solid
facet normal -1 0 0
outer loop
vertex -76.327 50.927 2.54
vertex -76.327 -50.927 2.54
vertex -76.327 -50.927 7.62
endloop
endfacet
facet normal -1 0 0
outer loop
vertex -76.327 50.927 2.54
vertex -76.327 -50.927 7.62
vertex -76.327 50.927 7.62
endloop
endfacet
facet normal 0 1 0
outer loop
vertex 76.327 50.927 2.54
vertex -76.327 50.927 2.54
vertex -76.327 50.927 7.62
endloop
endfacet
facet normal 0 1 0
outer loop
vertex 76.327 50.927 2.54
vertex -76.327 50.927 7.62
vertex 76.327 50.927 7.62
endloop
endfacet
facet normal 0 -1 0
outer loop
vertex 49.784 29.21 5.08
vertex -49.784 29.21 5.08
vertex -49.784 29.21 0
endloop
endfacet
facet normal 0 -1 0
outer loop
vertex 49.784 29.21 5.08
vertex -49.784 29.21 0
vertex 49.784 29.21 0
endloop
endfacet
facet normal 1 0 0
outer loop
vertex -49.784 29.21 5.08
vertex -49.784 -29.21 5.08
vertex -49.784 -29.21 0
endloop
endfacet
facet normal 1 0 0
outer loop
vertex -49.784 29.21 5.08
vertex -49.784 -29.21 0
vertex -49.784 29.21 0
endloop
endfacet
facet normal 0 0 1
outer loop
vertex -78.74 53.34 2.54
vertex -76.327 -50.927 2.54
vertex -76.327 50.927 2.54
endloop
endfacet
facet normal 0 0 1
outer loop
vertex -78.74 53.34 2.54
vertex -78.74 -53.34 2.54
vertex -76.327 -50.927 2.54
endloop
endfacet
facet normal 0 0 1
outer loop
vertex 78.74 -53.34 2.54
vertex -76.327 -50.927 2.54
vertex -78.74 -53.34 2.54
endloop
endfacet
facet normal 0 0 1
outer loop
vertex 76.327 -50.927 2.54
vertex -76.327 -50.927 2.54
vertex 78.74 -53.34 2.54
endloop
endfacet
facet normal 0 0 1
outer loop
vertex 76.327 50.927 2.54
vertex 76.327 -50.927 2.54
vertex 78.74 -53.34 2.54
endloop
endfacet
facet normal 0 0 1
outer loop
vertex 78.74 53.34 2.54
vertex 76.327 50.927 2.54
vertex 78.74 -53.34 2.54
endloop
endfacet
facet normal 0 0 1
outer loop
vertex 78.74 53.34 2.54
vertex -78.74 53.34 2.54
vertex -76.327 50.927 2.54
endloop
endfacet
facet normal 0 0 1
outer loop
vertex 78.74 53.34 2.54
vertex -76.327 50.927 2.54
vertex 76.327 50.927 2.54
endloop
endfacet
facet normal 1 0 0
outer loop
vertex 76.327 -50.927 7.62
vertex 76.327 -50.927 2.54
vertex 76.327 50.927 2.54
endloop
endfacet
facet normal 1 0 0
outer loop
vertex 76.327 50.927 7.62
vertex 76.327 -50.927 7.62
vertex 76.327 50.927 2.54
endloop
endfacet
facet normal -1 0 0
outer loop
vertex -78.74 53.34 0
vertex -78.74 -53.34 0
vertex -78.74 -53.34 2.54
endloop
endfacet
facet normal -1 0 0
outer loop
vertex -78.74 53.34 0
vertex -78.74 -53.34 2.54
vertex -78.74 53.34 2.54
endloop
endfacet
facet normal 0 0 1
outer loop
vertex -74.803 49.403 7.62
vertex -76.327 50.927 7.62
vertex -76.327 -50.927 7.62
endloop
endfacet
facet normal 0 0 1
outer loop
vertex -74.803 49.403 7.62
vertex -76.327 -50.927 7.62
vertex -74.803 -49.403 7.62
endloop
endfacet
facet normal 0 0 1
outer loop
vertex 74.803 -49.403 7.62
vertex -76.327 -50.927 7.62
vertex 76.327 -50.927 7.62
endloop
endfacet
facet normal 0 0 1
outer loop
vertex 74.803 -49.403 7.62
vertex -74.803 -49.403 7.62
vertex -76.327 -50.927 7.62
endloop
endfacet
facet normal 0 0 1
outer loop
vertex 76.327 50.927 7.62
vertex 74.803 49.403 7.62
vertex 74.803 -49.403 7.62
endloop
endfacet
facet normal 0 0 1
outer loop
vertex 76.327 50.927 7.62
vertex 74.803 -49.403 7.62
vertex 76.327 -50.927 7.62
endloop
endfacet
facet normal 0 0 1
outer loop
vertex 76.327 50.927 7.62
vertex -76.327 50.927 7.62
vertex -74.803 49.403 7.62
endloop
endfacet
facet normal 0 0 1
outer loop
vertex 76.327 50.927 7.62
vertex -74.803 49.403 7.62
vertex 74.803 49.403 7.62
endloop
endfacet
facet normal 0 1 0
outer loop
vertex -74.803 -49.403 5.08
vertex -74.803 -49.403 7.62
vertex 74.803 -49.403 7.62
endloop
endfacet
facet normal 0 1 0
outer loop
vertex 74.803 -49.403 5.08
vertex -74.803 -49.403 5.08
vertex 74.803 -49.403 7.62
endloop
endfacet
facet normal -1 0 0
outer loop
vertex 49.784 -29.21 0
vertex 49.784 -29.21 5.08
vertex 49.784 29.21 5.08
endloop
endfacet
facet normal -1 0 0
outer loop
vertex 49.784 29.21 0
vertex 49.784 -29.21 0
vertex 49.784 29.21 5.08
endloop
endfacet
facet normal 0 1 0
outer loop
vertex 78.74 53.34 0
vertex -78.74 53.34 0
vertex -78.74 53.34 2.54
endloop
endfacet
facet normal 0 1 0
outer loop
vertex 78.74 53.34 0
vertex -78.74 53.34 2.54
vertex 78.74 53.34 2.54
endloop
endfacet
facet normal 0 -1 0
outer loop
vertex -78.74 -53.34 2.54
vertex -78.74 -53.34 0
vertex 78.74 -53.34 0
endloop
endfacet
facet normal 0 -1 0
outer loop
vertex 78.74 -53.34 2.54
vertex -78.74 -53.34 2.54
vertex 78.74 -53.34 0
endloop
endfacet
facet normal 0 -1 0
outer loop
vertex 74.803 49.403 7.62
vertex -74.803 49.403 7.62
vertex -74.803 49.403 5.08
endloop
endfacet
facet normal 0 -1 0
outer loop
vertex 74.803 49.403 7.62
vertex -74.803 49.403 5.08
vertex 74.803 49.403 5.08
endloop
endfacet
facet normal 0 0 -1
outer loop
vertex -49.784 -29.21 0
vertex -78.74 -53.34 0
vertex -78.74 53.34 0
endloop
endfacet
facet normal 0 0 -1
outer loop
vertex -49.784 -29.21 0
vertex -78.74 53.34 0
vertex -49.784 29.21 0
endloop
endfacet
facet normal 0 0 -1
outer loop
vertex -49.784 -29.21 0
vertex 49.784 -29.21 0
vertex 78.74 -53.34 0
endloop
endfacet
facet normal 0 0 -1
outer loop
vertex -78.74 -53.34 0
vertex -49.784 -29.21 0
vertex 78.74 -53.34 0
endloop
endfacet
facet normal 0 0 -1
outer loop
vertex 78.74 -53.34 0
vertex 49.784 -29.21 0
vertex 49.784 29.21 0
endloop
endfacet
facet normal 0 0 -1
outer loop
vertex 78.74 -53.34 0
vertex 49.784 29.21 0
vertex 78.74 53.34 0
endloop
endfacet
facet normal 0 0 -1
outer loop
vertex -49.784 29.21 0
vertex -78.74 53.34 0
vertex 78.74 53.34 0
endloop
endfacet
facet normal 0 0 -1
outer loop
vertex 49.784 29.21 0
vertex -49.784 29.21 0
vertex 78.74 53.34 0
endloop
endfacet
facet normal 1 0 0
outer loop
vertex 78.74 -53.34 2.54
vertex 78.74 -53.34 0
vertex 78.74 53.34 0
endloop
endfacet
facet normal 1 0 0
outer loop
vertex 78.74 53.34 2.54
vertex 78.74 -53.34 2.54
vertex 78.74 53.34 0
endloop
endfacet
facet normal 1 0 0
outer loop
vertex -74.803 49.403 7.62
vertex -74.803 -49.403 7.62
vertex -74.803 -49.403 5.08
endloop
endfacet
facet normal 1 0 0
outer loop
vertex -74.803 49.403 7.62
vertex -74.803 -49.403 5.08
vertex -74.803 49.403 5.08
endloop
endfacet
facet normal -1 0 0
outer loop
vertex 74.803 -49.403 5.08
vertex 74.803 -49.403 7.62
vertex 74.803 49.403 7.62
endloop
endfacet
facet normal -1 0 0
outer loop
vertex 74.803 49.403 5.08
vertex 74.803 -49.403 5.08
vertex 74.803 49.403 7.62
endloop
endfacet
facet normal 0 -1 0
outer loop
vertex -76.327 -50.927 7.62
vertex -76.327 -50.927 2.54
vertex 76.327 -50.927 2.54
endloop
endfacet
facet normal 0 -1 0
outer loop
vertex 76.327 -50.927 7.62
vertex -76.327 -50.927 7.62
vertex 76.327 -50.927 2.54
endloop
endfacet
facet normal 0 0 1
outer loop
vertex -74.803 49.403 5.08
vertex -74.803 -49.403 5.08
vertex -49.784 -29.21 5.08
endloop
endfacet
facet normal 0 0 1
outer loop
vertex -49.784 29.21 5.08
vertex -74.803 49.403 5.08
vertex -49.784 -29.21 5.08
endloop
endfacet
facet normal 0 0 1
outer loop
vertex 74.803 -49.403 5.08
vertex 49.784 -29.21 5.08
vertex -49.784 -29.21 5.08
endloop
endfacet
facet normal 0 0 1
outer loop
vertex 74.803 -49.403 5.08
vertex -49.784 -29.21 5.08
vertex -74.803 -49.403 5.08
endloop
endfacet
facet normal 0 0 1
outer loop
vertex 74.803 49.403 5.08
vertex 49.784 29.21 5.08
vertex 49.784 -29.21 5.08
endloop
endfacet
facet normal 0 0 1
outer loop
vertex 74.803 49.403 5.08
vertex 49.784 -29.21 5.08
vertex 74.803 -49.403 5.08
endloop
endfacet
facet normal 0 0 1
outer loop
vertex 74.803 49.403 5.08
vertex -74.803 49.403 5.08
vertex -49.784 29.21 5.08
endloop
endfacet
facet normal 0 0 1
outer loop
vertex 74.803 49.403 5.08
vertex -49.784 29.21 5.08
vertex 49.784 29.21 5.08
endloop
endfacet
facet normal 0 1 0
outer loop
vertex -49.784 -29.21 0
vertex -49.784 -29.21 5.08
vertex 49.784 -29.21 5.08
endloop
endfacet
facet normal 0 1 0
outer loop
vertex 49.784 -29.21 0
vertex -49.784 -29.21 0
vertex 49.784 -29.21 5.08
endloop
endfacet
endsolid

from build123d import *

# Parameters (mm, degrees)
SKETCH1_W           = 157.48
SKETCH1_H           = 106.68
BOSS_EXTRUDE1_DEPTH = 2.54
SKETCH2_W           = 152.654
SKETCH2_H           = 101.854
BOSS_EXTRUDE2_DEPTH = 5.08
SKETCH3_W           = 149.606
SKETCH3_H           = 98.806
CUT_EXTRUDE1_DEPTH  = 2.54
SKETCH4_W           = 99.568
SKETCH4_H           = 58.42
CUT_EXTRUDE2_DEPTH  = 96.241532957


with BuildPart() as part:
    # Sketch1 → Boss-Extrude1 (new body)
    with BuildSketch(Plane.XY):
        Rectangle(SKETCH1_W, SKETCH1_H)
    extrude(amount=BOSS_EXTRUDE1_DEPTH)

    # Sketch2 → Boss-Extrude2 (add)
    with BuildSketch(Plane.XY.offset(2.54)):
        Rectangle(SKETCH2_W, SKETCH2_H)
    extrude(amount=BOSS_EXTRUDE2_DEPTH)

    # Sketch3 → Cut-Extrude1 (cut)
    with BuildSketch(Plane.XY.offset(7.62)):
        Rectangle(SKETCH3_W, SKETCH3_H)
    extrude(amount=-CUT_EXTRUDE1_DEPTH, mode=Mode.SUBTRACT)

    # Sketch4 → Cut-Extrude2 (cut, through all)
    with BuildSketch(Plane.XY.offset(5.08)):
        Rectangle(SKETCH4_W, SKETCH4_H)
    extrude(amount=-CUT_EXTRUDE2_DEPTH, mode=Mode.SUBTRACT)


solid = part.part
